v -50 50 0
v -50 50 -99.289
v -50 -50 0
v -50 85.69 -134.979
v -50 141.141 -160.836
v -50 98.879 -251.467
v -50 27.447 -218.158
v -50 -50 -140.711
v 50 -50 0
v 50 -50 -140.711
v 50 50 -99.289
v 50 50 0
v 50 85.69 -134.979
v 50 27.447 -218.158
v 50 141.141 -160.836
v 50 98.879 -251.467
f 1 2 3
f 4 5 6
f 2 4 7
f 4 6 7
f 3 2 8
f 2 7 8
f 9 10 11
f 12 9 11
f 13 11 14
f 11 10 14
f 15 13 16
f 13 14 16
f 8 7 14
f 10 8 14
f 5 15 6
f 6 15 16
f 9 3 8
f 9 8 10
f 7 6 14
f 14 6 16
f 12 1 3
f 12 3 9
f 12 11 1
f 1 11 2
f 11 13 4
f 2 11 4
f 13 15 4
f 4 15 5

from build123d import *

# Parameters (mm, degrees)
SKETCH1_W = 100
SKETCH1_H = 100


with BuildPart() as part:
    # Sweep1: sweep along a path in Sketch3
    with BuildLine(Plane(origin=(0, 0, 0), x_dir=(0, 0, -1), z_dir=(1, 0, 0))) as sweep1_path:
        Line((0, 0), (120, 0))
        Line((120, 0), (176.568542495, 56.568542495))
        Line((176.568542495, 56.568542495), (206.151820817, 120.010087587))
    # Sketch1 → Sweep1 (sweep)
    with BuildSketch(Plane.XY):
        Rectangle(SKETCH1_W, SKETCH1_H)
    sweep(path=sweep1_path.line, transition=Transition.RIGHT)


solid = part.part
